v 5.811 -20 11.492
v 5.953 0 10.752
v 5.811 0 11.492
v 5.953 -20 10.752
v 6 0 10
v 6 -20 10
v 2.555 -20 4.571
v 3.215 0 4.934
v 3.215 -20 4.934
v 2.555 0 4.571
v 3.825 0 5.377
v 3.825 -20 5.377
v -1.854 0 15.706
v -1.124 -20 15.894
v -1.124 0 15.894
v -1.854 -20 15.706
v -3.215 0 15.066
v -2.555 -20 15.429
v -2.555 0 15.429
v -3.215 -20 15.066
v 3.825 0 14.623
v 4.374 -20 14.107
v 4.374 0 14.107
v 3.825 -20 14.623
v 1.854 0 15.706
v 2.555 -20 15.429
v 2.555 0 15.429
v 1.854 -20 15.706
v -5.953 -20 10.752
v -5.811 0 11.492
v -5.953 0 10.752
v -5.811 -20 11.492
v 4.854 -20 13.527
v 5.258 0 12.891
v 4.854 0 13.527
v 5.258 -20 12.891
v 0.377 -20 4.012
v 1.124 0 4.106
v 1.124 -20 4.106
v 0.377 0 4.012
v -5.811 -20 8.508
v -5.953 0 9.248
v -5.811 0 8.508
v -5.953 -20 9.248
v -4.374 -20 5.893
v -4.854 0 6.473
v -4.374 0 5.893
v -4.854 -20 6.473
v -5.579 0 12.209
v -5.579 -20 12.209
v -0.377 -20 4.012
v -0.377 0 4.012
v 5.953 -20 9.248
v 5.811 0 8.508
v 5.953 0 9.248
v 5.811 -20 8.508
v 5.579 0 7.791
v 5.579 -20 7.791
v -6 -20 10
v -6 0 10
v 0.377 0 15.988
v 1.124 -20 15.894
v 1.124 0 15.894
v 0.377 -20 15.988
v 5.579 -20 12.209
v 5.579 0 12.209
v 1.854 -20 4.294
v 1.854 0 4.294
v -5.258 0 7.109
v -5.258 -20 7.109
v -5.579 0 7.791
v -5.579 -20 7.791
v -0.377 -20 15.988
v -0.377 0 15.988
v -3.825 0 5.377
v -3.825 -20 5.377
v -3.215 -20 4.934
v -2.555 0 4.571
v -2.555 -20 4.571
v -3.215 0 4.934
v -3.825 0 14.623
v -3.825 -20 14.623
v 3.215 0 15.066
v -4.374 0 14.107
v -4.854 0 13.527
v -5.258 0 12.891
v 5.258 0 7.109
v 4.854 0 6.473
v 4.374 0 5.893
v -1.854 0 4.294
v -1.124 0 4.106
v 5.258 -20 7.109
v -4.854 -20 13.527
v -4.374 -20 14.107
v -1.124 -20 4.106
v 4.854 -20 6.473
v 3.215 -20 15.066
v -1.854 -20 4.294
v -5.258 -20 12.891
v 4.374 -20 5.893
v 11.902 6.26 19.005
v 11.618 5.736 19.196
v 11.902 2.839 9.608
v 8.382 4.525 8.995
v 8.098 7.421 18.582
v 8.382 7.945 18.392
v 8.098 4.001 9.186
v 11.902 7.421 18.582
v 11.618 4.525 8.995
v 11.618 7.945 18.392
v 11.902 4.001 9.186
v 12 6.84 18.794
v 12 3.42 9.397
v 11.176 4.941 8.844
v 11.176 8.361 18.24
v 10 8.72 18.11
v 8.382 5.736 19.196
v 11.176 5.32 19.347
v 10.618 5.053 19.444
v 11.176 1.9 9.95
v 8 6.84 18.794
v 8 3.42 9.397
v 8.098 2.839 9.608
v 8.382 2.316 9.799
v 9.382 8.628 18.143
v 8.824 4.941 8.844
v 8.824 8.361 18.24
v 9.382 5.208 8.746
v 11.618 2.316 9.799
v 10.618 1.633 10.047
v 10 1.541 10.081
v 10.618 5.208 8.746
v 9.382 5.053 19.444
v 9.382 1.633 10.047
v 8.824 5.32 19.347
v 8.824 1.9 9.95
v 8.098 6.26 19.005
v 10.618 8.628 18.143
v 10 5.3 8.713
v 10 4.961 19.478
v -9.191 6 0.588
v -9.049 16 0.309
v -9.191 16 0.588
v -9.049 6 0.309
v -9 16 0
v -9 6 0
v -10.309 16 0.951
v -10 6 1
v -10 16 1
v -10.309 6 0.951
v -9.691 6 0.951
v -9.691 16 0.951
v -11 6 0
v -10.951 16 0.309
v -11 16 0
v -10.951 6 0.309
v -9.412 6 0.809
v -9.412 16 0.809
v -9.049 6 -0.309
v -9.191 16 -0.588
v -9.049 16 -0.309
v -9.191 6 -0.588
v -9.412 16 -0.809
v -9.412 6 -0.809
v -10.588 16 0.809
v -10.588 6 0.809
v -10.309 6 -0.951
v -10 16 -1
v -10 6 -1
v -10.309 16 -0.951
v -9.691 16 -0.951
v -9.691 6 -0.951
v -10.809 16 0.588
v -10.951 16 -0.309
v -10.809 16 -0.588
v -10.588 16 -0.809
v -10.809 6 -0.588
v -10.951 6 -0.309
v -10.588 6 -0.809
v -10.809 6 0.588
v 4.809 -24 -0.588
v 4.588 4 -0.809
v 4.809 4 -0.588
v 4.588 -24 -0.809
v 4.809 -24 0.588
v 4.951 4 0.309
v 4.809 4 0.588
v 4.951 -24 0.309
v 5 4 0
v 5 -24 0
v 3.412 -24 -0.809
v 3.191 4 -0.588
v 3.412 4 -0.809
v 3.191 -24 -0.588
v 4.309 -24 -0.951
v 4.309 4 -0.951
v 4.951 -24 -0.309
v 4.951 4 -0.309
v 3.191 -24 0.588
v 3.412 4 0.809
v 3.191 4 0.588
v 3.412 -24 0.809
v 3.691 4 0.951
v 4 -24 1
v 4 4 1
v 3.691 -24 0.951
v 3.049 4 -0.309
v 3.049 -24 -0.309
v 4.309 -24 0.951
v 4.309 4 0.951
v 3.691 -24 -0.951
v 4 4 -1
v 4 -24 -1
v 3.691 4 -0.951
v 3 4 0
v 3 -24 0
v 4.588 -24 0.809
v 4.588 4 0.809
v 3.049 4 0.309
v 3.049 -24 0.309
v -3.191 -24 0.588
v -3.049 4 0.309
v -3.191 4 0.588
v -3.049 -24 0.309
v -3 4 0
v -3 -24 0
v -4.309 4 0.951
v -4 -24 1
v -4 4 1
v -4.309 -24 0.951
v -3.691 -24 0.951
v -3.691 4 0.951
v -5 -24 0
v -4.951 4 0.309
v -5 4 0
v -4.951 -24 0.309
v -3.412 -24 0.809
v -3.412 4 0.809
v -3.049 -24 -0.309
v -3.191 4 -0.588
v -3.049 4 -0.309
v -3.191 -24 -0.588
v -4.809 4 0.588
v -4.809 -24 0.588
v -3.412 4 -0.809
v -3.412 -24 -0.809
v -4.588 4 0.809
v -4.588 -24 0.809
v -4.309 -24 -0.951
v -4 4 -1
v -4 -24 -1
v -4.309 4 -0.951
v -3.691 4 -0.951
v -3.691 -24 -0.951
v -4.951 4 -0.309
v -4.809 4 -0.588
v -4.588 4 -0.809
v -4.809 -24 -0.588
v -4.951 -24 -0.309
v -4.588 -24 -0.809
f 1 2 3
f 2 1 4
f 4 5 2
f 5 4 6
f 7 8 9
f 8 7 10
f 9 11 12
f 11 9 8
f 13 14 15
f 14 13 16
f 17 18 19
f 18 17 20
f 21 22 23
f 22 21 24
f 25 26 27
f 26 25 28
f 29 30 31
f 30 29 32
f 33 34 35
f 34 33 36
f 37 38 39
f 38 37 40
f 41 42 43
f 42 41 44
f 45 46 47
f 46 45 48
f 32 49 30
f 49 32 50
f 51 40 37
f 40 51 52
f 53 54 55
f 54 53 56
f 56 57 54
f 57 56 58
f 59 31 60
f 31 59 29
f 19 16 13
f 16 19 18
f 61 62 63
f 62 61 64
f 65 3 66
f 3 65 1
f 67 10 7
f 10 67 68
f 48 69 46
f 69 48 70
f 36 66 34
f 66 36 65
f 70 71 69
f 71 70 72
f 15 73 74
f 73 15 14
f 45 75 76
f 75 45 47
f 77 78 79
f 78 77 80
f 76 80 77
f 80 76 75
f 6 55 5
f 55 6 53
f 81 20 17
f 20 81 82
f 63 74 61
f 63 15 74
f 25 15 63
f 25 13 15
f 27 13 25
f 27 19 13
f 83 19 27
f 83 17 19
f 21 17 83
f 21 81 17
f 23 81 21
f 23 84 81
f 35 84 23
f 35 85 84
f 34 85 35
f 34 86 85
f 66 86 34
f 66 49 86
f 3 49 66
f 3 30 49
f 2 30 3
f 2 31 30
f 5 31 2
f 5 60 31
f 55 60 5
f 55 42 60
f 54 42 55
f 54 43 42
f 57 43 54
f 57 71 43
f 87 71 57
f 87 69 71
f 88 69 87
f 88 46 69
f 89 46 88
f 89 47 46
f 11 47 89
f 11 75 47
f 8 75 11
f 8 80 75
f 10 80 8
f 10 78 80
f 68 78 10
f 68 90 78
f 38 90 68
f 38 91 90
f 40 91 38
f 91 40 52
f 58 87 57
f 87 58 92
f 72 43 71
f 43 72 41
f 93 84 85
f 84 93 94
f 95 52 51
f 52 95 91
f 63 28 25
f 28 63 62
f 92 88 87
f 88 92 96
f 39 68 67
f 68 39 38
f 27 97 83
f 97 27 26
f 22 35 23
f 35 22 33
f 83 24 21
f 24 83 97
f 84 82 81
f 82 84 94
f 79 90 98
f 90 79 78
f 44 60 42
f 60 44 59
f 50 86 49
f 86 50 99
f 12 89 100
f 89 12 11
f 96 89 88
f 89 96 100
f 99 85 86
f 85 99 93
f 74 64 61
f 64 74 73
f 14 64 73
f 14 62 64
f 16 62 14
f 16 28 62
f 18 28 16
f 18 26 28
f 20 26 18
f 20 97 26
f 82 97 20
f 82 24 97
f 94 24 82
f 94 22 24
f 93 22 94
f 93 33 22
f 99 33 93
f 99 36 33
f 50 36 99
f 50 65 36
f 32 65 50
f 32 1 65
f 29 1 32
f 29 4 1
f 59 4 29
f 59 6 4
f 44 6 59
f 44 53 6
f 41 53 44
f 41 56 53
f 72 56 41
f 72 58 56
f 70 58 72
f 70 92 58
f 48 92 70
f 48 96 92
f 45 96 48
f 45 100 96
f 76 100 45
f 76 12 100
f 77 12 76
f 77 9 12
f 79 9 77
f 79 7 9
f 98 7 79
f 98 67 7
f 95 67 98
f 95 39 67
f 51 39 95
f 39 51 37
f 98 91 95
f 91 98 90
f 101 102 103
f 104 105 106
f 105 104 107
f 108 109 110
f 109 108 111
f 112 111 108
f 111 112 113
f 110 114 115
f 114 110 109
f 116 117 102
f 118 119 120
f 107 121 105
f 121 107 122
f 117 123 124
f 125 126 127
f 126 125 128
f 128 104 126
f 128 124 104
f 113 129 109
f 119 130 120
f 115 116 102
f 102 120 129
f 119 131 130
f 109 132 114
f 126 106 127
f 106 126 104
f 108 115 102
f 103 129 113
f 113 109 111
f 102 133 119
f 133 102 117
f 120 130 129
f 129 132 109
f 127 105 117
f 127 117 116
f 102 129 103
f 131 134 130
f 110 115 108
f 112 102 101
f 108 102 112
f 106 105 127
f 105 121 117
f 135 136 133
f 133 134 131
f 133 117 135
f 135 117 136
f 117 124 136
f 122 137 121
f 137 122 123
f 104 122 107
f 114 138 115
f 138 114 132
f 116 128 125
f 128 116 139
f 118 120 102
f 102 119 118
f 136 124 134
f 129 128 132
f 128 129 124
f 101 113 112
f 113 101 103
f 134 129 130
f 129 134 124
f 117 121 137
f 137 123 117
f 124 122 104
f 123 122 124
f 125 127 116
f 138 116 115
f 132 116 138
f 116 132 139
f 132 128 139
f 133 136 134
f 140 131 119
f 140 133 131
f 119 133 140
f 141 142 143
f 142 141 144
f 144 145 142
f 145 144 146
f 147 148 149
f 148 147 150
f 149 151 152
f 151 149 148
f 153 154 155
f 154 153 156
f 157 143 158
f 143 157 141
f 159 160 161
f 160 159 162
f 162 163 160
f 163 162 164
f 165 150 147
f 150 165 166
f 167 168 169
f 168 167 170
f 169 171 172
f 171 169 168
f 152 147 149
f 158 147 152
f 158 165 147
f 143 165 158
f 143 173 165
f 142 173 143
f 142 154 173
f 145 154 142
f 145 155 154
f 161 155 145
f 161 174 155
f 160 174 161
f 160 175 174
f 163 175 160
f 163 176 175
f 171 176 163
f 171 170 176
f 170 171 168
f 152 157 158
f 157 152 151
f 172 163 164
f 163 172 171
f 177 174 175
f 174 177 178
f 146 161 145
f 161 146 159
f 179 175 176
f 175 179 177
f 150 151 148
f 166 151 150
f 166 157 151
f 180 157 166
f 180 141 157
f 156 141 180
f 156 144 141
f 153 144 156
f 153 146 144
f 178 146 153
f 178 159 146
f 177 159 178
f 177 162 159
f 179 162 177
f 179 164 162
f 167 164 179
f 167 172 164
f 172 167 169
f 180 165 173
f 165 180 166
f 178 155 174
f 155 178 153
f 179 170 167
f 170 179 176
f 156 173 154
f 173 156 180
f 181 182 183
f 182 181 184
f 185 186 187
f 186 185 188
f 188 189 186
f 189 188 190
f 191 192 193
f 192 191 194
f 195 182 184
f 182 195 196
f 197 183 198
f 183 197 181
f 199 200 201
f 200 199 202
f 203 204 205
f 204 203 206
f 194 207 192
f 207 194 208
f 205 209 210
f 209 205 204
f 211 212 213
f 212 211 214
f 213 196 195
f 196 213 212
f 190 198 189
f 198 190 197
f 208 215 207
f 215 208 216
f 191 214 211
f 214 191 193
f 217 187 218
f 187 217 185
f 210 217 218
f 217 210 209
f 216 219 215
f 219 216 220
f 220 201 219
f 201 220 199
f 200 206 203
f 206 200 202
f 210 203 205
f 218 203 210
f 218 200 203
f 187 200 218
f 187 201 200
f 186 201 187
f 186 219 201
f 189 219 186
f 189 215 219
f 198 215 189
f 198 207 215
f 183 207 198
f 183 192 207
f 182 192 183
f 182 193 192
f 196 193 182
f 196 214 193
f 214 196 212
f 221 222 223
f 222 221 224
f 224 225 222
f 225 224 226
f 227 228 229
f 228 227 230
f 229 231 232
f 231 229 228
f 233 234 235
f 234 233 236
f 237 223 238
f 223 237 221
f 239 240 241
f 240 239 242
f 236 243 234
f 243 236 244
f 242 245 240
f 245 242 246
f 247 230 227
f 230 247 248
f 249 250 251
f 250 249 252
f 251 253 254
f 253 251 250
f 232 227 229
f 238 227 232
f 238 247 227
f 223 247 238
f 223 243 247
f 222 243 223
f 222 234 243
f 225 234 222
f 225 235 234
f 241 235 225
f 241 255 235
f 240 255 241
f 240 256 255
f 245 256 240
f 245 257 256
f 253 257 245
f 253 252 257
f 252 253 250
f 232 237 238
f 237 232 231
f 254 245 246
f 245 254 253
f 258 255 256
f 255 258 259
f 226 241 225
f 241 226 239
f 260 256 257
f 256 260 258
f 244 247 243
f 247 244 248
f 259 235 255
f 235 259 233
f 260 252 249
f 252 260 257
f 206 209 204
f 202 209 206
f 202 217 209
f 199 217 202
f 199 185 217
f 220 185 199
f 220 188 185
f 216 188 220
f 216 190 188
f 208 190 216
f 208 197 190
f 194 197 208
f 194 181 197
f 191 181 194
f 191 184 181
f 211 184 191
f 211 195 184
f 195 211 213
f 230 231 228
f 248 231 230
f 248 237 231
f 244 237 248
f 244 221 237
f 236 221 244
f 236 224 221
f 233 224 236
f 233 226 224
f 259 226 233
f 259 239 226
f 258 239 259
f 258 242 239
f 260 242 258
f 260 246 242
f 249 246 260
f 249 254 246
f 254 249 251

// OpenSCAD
// Abstract representation of a horse

// Parameters
scale_factor = 2;

// Main body
module horse() {
    difference() {
        // Body
        translate([0, 0, 5 * scale_factor])
        scale([scale_factor, scale_factor, scale_factor])
        rotate([90, 0, 0]) {
            cylinder(h=10, r1=3, r2=3, center=false, $fn=50); // Main body
        }
        
        // Head
        translate([6 * scale_factor, 0, 8 * scale_factor])
        scale([scale_factor, scale_factor, scale_factor])
        rotate([90, 0, 0]) {
            cylinder(h=5, r1=2, r2=2, center=false, $fn=50);
        }
    }
}

// Legs
module leg() {
    scale([scale_factor, scale_factor, scale_factor])
    rotate([90, 0, 0]) {
        cylinder(h=10, r1=0.5, r2=0.5, center=false, $fn=20);
    }
}

// Neck
module neck() {
    scale([scale_factor, scale_factor, scale_factor])
    rotate([-20, 0, 0]) {
        translate([5, 0, 5])
        cylinder(h=5, r1=1, r2=1, center=false, $fn=20);
    }
}

// Tail
module tail() {
    scale([scale_factor, scale_factor, scale_factor])
    rotate([90, 0, 0]) {
        translate([-5, 0, -8])
        cylinder(h=5, r1=0.5, r2=0.5, center=false, $fn=20);
    }
}

// Assembly
union() {
    horse();
    neck();
    tail();
    // Legs
    translate([2 * scale_factor, 2 * scale_factor, 0])
    leg();
    translate([-2 * scale_factor, 2 * scale_factor, 0])
    leg();
    translate([2 * scale_factor, -2 * scale_factor, 0])
    leg();
    translate([-2 * scale_factor, -2 * scale_factor, 0])
    leg();
}
